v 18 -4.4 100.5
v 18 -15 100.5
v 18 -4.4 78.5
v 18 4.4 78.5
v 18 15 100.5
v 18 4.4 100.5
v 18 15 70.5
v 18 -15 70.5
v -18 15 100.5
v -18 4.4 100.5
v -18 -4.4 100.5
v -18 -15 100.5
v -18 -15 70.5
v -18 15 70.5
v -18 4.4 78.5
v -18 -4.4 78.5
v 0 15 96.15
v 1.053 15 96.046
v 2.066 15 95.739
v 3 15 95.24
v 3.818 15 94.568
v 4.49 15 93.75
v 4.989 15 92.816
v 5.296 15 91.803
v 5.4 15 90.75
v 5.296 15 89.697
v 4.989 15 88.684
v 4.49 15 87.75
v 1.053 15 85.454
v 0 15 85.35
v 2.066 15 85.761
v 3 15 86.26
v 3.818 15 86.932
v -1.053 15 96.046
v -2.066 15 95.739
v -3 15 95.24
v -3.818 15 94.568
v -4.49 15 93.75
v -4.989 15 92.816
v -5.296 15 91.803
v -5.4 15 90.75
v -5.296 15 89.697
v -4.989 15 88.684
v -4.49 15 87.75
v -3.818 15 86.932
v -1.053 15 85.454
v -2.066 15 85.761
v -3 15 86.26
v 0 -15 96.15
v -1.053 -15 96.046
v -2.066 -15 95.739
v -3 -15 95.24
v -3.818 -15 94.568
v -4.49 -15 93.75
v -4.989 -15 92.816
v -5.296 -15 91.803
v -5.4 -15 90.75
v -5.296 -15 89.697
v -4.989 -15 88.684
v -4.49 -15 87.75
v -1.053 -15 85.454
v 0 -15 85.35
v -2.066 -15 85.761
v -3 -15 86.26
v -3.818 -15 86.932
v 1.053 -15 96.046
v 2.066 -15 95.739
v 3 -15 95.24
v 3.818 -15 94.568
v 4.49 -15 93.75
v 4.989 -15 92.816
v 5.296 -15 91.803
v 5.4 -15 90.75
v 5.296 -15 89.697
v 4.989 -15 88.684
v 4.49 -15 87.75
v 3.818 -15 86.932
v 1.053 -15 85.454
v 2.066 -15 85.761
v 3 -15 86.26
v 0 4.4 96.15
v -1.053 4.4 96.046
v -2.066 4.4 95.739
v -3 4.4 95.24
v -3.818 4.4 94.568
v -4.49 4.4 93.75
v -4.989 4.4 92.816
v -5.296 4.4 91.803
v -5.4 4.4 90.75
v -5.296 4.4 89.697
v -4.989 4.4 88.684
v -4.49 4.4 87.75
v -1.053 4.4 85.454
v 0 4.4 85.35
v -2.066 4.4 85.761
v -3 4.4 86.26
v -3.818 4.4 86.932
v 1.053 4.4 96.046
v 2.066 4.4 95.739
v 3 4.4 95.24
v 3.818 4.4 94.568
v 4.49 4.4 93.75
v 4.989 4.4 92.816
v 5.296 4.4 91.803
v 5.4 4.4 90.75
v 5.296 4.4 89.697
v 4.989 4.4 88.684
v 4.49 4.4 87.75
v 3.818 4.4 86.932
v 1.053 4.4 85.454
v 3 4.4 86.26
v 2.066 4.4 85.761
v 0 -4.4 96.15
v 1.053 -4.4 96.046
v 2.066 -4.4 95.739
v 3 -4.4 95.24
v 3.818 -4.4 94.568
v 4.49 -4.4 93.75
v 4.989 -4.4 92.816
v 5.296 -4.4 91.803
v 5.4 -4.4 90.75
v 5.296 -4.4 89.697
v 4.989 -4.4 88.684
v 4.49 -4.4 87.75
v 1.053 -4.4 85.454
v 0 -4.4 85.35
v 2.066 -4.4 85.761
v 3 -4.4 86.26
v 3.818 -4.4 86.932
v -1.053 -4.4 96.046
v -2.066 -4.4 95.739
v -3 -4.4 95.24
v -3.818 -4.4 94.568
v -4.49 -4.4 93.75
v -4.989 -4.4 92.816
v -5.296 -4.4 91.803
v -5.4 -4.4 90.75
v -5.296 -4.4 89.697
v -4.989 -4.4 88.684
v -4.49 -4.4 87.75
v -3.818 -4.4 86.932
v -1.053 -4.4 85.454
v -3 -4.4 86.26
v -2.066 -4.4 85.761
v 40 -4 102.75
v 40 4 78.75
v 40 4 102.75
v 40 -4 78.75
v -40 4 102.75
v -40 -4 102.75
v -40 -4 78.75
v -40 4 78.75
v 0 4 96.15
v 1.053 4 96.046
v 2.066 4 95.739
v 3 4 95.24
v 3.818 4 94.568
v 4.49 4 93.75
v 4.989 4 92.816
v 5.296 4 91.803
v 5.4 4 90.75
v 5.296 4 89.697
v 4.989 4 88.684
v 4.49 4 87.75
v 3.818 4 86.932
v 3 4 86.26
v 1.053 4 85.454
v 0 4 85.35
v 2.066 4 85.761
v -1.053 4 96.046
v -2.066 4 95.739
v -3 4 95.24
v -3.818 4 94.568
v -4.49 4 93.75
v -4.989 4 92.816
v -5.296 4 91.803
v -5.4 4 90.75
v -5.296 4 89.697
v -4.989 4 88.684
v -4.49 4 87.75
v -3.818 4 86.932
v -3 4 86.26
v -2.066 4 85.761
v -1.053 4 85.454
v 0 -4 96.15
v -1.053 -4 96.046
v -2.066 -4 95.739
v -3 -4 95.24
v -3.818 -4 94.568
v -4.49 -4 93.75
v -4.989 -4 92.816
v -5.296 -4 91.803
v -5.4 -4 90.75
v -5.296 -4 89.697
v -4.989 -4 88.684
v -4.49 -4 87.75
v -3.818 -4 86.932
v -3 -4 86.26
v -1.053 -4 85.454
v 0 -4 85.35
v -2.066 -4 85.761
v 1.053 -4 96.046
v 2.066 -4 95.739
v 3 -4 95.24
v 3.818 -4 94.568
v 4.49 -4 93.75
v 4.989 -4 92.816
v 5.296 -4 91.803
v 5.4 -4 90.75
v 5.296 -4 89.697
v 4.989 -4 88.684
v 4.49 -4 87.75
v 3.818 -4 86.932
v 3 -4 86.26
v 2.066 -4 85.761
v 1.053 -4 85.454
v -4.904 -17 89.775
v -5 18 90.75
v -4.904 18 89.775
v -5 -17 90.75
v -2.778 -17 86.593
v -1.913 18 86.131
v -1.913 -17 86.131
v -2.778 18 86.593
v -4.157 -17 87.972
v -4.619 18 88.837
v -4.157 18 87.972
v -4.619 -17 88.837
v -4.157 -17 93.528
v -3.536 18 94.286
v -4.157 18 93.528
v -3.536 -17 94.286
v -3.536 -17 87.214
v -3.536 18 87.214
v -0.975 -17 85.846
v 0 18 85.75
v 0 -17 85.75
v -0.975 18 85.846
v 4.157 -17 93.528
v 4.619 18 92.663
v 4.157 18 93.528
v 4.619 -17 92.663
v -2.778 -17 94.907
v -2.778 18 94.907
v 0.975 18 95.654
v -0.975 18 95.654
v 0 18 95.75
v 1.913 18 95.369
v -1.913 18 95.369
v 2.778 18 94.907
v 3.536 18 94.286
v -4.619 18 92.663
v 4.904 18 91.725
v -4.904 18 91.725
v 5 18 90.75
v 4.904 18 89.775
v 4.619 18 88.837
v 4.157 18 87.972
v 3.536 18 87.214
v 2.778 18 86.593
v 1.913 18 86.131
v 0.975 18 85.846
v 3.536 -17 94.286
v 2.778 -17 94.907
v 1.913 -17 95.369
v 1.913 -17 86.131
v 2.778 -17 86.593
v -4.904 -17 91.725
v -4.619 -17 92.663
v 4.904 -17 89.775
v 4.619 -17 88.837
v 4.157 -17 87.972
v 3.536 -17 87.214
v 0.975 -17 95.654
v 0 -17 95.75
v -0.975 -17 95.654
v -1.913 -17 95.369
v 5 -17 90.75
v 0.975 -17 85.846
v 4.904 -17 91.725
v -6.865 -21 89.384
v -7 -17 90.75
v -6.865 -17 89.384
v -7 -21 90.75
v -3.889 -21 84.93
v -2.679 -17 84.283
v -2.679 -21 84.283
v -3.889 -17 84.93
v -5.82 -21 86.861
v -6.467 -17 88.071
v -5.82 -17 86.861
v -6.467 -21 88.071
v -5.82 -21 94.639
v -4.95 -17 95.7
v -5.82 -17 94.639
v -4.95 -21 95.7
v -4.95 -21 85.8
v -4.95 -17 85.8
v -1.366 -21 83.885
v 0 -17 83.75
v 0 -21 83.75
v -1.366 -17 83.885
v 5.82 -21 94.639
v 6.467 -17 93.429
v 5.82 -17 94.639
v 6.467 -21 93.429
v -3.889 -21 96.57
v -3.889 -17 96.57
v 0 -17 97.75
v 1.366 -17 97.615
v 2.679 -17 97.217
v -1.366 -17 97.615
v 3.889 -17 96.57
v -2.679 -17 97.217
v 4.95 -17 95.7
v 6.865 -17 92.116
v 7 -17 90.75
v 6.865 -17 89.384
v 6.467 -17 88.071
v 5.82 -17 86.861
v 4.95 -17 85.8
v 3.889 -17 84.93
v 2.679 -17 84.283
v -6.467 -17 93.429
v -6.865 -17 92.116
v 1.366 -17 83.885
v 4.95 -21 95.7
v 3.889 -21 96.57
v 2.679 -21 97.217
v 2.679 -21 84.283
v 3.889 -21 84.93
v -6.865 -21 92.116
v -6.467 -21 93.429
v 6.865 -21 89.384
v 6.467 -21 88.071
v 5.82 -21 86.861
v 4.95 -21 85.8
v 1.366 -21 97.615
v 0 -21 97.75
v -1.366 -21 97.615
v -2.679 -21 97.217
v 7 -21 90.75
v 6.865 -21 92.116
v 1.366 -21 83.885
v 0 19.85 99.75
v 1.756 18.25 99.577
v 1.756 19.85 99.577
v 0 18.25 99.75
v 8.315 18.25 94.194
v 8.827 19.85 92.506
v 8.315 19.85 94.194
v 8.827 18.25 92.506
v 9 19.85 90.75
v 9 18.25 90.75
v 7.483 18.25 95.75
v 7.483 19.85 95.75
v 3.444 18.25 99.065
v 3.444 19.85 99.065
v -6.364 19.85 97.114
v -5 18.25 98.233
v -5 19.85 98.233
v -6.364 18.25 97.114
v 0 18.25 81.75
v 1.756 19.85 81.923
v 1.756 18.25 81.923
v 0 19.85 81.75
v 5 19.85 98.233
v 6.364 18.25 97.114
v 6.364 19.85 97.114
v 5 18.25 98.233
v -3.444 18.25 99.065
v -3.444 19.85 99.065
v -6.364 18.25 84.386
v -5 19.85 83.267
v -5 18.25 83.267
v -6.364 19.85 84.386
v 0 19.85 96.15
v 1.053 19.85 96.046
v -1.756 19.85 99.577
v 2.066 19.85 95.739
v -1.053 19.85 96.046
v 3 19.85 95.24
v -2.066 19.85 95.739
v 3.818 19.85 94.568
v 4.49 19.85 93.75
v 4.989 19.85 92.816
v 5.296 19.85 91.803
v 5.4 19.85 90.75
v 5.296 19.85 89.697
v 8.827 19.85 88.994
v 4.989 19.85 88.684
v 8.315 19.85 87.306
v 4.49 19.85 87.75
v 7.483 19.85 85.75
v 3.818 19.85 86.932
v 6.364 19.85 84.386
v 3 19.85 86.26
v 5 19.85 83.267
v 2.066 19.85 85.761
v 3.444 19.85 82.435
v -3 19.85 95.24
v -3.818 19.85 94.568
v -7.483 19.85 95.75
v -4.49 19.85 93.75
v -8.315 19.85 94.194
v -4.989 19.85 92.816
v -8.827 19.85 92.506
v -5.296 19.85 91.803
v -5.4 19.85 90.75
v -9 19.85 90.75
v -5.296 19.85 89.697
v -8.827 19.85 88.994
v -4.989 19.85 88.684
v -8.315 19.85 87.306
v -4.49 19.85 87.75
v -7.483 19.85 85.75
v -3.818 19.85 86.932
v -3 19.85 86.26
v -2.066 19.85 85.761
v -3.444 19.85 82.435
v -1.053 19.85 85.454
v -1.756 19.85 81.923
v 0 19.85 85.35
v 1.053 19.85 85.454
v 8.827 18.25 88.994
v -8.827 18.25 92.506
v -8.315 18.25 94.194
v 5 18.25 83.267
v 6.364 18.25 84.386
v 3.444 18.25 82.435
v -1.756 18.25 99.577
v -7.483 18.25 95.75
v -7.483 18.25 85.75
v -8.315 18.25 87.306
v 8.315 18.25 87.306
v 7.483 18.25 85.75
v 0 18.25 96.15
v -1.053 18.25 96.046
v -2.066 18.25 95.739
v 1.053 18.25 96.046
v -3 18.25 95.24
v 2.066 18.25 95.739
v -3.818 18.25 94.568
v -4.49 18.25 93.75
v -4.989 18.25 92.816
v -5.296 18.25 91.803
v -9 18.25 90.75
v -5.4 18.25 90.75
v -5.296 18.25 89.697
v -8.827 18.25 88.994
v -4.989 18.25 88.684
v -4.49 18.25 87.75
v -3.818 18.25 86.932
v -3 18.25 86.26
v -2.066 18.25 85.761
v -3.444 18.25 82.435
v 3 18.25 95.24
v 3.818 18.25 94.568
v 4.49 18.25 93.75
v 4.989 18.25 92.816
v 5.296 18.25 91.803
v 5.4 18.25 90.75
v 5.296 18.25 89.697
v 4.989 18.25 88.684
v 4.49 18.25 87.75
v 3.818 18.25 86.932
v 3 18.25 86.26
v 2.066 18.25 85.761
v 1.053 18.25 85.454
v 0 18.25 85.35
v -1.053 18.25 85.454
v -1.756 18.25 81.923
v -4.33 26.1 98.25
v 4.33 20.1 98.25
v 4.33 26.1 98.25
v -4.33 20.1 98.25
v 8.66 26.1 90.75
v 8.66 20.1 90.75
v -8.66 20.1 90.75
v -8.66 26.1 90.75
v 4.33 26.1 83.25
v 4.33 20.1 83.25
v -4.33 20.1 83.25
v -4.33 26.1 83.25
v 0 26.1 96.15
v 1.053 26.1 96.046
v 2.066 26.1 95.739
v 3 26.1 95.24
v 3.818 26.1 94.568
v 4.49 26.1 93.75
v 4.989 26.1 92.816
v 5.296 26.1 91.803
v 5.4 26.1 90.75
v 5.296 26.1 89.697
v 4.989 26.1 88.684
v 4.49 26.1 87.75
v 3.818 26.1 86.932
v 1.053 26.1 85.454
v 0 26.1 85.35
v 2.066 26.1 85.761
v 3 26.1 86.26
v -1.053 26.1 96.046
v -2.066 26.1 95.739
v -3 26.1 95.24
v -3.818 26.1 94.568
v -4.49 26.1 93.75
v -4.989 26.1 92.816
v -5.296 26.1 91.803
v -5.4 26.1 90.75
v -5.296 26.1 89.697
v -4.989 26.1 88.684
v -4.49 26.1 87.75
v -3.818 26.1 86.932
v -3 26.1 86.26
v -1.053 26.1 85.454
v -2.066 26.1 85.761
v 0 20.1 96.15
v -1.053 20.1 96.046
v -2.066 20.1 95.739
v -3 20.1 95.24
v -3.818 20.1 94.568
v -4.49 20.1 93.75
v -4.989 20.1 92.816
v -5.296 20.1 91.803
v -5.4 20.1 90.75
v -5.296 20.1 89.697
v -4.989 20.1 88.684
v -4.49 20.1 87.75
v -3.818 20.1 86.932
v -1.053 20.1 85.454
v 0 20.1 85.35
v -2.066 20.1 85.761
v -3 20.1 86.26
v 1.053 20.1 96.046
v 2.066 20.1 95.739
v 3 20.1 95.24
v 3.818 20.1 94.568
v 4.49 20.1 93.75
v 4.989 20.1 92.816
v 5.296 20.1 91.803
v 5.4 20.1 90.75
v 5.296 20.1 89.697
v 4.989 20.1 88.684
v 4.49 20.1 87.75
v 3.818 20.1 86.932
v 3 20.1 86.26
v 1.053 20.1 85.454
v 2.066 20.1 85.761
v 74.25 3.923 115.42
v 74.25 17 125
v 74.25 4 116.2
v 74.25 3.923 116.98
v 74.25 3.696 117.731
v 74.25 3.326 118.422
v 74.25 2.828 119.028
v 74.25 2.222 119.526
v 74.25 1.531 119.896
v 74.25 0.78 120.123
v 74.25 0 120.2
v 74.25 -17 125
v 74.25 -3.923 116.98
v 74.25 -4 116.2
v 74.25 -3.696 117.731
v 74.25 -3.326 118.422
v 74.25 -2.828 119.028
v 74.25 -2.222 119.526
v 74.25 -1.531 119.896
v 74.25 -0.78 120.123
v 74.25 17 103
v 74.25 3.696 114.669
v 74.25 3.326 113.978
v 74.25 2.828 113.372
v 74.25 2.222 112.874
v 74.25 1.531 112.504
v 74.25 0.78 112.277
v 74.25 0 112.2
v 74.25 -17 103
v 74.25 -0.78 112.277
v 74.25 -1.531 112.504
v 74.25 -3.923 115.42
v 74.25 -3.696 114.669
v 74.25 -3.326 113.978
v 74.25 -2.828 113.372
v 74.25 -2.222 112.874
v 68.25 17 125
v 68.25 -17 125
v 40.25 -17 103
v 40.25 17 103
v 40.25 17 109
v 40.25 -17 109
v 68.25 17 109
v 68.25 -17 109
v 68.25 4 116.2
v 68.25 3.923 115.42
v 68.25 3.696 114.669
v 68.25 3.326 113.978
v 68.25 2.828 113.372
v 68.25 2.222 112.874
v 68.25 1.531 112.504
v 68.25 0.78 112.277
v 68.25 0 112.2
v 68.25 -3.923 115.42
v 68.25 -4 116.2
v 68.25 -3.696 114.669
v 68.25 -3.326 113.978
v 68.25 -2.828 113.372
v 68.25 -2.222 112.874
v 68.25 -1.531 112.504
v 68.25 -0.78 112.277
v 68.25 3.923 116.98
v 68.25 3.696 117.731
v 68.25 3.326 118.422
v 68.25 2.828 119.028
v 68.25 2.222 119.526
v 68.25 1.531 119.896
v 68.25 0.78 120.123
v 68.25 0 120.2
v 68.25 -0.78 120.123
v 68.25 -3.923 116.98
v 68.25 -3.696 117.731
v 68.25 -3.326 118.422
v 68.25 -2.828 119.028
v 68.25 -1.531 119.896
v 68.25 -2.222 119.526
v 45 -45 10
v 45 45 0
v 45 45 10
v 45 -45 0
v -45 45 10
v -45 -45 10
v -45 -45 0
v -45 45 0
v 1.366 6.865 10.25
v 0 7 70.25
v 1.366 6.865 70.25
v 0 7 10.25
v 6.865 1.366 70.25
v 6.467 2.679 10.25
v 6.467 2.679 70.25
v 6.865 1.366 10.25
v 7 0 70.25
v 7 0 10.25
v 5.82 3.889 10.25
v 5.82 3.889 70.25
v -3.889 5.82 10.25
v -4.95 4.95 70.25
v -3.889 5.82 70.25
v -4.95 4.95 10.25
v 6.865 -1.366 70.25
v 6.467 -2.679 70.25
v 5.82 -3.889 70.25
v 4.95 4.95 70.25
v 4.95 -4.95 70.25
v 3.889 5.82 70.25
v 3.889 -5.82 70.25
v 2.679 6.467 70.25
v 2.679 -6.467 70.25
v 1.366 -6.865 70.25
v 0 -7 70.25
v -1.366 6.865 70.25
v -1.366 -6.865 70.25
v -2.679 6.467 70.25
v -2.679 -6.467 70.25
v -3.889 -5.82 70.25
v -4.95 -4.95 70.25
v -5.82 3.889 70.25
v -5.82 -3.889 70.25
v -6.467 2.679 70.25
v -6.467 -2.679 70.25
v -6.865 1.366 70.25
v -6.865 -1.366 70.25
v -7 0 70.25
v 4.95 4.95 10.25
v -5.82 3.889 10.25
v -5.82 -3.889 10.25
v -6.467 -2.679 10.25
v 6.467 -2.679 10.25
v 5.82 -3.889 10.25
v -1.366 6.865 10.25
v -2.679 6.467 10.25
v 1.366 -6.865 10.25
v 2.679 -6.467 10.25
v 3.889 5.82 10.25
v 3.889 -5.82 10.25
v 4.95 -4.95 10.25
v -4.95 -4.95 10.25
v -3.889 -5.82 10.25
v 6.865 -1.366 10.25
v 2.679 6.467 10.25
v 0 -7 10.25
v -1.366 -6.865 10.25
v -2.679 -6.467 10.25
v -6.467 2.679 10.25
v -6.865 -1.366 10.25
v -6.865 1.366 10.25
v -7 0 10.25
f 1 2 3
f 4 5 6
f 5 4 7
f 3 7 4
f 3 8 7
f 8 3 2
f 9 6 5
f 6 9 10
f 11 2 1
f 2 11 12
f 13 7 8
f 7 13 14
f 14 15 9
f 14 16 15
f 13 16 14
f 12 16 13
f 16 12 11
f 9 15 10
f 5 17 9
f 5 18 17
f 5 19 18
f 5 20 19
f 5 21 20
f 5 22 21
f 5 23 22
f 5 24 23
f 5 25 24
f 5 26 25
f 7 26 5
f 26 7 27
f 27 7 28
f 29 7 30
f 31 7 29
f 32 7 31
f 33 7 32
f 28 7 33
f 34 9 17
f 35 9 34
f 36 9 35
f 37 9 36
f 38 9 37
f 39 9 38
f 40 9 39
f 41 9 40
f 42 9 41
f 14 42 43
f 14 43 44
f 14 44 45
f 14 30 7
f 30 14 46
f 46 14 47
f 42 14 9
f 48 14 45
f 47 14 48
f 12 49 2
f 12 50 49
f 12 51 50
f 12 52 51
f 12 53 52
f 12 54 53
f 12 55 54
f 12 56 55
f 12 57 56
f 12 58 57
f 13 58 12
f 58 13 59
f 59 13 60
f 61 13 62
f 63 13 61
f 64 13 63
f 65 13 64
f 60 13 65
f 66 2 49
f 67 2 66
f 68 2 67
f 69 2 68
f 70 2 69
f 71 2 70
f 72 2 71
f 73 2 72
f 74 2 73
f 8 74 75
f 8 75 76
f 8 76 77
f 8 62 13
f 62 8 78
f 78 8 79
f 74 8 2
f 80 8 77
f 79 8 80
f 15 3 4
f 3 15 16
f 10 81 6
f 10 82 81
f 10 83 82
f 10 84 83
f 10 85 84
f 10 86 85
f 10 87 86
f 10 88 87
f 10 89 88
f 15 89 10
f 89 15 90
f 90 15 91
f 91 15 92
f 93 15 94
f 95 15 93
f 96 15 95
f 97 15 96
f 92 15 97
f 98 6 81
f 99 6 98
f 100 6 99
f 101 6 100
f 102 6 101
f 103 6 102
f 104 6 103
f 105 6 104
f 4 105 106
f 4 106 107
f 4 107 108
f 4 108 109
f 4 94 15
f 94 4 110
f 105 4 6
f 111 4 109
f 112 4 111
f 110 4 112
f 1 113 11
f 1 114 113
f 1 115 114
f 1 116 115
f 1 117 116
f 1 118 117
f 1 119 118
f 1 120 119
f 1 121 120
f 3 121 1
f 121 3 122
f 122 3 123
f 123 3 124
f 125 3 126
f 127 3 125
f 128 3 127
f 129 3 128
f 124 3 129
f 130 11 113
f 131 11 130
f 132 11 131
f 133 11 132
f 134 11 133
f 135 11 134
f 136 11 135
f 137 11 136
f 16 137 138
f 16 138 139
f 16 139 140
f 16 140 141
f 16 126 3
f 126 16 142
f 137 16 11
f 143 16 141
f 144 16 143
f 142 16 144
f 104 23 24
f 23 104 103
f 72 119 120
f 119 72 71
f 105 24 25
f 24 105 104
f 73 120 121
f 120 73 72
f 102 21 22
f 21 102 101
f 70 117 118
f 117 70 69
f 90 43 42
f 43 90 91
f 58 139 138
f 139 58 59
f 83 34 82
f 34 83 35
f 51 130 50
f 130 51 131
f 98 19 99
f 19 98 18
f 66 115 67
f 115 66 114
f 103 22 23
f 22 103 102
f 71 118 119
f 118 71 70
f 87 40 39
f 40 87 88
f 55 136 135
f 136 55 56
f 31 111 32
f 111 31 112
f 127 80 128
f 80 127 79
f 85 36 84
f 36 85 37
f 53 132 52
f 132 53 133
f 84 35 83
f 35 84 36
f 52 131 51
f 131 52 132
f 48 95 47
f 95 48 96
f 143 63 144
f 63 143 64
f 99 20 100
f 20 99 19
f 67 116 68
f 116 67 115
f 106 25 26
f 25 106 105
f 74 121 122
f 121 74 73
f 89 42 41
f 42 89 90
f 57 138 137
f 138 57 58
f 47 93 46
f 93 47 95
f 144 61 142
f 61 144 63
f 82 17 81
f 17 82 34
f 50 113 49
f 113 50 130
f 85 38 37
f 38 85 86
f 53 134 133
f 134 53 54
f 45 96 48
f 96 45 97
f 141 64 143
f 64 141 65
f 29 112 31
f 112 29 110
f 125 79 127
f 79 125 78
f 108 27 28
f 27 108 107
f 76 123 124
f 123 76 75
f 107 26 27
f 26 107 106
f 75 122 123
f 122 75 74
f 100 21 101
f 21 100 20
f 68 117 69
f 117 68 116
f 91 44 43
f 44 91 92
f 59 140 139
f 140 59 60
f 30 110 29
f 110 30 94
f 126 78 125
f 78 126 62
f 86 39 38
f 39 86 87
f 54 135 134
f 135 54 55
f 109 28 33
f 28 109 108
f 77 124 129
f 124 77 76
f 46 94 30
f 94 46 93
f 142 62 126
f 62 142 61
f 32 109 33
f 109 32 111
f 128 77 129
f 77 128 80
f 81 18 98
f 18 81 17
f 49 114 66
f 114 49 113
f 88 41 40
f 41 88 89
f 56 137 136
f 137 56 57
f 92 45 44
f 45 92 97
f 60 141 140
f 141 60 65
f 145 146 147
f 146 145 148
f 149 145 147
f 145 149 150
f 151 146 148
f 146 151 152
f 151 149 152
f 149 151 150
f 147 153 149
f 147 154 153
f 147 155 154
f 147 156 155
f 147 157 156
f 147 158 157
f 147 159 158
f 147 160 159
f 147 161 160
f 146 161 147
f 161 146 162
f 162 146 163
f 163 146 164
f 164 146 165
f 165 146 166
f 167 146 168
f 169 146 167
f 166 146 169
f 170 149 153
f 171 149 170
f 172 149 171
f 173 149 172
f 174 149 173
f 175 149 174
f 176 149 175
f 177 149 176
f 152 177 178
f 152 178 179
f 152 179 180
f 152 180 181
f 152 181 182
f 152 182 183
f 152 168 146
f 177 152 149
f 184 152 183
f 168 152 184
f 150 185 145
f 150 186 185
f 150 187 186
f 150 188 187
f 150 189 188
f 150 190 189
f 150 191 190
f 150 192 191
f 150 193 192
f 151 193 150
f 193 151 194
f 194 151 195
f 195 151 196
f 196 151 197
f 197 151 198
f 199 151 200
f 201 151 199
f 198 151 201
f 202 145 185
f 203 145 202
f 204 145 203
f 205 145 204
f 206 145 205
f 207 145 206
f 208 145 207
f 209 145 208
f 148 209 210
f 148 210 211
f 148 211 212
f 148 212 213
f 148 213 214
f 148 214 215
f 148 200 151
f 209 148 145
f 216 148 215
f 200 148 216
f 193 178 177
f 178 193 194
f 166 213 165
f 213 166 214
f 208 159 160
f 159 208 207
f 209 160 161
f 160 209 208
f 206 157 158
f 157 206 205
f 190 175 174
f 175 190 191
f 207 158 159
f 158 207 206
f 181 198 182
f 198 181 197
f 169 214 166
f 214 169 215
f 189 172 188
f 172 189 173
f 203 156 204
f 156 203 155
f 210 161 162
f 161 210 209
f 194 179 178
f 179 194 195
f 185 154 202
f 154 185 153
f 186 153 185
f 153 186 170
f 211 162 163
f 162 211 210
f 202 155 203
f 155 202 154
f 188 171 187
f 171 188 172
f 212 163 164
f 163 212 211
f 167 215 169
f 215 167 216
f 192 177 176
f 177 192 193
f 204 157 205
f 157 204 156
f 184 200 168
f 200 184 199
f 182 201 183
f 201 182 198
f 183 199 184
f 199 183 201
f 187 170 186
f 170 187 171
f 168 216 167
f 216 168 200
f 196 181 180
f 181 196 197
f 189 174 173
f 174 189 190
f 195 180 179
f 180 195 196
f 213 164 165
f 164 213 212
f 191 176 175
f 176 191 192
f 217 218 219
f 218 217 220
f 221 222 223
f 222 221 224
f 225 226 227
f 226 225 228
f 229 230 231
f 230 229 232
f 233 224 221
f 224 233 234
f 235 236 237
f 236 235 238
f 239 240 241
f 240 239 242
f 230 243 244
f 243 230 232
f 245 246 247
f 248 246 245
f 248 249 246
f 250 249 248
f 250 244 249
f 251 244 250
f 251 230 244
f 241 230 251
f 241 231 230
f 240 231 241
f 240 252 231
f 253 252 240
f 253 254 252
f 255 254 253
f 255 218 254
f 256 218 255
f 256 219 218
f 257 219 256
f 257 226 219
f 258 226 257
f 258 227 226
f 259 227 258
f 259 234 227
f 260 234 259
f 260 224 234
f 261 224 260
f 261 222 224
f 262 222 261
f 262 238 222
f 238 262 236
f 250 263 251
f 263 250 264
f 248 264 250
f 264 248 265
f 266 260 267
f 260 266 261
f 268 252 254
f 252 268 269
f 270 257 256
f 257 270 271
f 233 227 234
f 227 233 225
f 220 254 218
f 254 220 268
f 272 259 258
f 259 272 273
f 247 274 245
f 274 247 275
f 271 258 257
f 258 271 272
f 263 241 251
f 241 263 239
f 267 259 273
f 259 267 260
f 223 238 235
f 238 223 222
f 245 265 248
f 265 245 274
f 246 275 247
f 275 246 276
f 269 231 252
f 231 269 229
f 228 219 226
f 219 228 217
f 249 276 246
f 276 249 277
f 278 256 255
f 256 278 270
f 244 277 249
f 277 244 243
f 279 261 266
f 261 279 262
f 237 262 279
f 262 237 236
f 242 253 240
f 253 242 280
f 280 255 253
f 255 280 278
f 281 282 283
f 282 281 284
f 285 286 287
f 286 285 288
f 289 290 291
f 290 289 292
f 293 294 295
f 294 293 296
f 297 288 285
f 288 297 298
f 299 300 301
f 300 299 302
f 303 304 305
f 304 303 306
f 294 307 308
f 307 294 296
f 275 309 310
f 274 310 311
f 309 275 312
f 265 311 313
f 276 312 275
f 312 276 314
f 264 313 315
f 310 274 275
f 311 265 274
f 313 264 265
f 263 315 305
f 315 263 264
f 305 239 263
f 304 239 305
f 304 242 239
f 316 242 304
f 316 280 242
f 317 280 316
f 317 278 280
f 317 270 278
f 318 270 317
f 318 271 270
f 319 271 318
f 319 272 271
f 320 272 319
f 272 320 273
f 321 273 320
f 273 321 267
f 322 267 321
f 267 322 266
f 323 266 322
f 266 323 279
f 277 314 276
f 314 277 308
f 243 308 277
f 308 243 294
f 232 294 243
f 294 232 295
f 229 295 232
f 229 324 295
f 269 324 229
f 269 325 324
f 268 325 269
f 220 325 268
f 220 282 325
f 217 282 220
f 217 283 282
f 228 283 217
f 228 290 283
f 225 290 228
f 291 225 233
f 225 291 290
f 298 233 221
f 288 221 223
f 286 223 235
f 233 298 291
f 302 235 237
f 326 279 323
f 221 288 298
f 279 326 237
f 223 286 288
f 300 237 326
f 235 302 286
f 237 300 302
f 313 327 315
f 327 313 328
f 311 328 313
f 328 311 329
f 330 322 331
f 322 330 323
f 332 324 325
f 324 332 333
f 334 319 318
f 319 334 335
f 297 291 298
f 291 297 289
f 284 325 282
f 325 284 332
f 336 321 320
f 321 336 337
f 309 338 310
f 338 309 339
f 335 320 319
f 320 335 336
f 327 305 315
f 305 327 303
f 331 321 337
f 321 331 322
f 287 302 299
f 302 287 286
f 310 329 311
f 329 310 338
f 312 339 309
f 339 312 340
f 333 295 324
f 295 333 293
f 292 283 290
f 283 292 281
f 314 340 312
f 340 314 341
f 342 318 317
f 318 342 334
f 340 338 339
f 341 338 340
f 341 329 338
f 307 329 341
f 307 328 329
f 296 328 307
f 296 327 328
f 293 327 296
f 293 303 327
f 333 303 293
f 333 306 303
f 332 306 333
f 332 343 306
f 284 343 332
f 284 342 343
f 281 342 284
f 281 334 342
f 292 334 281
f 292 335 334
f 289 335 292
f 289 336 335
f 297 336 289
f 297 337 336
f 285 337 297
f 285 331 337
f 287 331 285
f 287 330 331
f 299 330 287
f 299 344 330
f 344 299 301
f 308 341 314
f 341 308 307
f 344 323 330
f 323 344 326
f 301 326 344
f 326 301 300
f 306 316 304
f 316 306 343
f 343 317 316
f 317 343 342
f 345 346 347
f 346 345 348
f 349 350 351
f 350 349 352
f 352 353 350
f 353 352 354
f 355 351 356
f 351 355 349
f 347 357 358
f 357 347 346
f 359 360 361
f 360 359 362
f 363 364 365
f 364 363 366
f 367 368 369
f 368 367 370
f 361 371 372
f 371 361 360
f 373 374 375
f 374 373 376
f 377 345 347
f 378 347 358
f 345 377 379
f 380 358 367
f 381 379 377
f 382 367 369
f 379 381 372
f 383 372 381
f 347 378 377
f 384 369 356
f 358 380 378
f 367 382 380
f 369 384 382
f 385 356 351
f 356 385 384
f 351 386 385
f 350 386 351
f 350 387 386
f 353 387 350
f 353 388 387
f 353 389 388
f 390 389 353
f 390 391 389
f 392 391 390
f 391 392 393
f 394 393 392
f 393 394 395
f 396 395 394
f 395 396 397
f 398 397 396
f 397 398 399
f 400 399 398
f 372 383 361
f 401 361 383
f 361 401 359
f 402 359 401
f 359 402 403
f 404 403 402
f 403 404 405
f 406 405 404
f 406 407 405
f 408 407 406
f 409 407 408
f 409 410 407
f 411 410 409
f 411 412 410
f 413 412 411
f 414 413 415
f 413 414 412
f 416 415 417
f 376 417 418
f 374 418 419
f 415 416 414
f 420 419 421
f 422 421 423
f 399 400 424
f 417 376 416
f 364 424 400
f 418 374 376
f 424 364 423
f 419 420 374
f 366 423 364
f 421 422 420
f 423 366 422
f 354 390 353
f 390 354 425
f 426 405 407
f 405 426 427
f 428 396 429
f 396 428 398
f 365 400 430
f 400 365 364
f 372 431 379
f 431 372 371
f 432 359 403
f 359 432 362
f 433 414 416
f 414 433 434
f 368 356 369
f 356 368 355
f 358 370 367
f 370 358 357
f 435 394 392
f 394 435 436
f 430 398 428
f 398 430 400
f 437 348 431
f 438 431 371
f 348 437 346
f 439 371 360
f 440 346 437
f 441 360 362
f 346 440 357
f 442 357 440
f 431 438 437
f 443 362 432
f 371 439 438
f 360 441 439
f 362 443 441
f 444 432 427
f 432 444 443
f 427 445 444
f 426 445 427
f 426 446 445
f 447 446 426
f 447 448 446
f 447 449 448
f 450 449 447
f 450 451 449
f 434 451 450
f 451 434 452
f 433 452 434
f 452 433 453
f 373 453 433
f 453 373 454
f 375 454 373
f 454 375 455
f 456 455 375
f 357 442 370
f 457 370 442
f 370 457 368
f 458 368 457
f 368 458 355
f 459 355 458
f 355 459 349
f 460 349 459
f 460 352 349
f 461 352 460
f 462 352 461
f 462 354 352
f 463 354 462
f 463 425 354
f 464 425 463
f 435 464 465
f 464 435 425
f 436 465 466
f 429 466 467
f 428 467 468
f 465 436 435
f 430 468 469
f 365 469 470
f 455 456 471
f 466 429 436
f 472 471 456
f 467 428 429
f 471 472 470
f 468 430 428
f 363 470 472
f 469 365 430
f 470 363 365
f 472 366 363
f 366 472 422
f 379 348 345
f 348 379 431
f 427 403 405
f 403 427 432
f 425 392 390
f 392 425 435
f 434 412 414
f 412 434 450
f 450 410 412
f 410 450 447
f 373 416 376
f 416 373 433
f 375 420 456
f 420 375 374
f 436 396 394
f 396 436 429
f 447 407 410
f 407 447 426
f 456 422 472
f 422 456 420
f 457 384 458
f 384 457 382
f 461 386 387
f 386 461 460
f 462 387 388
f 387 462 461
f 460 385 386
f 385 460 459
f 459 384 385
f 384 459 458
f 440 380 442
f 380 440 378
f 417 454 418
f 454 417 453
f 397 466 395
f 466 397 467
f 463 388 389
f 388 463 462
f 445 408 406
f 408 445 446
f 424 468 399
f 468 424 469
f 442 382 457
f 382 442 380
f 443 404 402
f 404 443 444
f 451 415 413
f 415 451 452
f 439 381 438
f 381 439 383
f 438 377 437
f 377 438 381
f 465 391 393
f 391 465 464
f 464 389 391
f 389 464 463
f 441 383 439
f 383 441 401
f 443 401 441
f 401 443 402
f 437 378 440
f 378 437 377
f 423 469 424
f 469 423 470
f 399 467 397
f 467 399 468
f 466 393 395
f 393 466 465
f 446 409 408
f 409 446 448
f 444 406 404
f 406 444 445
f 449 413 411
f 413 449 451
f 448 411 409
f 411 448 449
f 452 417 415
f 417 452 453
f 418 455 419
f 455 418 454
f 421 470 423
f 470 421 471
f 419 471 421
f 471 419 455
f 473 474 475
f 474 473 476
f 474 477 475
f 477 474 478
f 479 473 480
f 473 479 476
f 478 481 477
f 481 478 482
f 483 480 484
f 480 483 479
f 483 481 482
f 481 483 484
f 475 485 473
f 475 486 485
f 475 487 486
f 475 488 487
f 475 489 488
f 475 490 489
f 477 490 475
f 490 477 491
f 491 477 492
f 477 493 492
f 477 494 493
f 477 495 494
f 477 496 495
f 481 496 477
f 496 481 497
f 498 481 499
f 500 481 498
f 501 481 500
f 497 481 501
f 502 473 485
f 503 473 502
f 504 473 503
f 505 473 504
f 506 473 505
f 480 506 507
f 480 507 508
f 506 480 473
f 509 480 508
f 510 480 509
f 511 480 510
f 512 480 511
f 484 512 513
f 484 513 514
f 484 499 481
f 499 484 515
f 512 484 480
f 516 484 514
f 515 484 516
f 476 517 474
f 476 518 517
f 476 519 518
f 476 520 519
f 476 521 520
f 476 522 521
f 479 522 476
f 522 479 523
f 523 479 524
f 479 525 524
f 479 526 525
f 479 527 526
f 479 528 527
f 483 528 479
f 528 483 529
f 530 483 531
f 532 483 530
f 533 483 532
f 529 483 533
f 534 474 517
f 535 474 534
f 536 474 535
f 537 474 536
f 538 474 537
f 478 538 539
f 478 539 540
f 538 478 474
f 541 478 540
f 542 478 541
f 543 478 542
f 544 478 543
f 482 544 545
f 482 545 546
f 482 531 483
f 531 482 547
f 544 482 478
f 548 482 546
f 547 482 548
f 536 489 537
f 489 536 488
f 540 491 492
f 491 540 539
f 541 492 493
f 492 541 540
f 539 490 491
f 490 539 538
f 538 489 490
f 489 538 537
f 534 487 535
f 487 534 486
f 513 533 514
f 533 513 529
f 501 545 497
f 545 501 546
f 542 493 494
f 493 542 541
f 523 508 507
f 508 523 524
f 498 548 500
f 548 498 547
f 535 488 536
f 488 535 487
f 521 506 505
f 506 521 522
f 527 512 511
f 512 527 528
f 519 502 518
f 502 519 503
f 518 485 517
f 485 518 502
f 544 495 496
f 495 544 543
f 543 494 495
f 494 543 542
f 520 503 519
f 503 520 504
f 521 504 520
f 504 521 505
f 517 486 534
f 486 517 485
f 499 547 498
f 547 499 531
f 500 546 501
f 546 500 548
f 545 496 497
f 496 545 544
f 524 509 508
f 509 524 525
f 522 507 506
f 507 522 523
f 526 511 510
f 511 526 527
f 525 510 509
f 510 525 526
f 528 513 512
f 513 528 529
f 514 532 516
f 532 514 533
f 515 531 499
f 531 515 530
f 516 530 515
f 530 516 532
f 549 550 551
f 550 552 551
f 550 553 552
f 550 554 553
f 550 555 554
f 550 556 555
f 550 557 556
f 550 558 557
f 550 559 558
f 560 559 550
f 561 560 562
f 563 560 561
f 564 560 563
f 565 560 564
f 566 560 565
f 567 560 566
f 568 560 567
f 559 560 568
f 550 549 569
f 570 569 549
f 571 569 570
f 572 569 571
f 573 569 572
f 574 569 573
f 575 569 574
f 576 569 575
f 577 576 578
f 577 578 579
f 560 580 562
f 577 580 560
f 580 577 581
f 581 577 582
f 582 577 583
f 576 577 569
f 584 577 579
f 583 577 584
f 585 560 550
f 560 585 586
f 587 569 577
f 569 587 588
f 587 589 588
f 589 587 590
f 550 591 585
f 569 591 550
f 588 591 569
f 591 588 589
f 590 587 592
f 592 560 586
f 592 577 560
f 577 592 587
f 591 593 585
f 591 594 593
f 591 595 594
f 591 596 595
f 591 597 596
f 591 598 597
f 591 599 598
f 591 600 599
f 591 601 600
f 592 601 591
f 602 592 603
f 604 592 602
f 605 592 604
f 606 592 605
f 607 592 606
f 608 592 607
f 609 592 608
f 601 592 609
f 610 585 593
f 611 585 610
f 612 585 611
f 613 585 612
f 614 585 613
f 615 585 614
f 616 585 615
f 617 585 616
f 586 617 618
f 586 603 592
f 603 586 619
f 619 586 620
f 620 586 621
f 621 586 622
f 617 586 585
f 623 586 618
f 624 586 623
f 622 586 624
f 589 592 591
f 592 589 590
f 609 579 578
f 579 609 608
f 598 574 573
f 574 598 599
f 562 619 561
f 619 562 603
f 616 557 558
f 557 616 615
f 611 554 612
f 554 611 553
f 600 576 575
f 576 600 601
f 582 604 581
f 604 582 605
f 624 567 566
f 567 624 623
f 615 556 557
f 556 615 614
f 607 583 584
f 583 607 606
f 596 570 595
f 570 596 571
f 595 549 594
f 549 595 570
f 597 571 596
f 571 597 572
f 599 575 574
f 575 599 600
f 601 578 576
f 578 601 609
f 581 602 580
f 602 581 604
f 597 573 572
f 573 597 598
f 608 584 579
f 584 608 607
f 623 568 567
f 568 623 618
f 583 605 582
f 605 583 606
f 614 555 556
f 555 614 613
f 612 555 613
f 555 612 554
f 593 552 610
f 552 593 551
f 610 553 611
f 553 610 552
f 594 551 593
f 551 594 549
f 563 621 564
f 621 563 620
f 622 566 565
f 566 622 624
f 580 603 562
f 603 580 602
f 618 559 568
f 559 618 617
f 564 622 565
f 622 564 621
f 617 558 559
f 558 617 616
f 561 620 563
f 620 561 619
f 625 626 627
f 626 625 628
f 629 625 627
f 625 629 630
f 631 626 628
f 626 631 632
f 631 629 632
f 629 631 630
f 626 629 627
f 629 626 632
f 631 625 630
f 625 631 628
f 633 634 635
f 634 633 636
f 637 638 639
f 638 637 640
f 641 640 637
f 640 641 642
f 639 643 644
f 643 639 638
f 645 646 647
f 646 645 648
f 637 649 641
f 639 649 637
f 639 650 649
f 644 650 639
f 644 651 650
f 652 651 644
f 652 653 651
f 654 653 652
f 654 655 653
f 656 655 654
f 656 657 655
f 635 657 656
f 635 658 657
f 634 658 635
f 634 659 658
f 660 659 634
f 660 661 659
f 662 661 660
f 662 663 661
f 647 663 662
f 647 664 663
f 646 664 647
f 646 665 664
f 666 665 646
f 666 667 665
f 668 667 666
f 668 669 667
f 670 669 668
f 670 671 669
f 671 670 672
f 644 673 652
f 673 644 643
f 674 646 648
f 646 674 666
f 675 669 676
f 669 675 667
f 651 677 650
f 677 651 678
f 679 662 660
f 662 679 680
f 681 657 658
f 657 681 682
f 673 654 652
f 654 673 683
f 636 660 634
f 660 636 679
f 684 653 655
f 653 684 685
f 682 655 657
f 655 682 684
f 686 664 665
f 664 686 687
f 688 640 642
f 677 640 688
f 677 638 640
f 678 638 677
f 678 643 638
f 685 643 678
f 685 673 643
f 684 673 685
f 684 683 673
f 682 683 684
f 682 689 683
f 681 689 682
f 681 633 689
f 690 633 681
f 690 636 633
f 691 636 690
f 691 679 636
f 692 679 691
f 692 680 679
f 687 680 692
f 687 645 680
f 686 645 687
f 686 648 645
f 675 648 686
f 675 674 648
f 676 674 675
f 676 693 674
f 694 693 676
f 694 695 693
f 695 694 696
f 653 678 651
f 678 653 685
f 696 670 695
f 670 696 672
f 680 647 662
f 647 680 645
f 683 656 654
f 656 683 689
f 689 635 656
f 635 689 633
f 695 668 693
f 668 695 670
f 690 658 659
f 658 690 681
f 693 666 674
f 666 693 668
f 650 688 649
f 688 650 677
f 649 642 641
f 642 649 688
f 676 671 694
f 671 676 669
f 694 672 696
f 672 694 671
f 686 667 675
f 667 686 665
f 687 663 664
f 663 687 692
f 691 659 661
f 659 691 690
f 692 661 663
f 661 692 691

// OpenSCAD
$fn = 32;

// ------------------------------------------------------------------------
// Lamp arm: column d14 x 60 mm, arm 80 mm
// Every part is its own module, assembly() places every instance.
// ------------------------------------------------------------------------

// --- part 1 ---
module lamp_base() {
  difference() {
    translate([-45, -45, 0]) cube([90, 90, 10]);
  }
}

// --- part 2 ---
module lamp_column() {
  cylinder(h = 60, d = 14);
}

// --- part 3 ---
module head_fork() {
  difference() {
    translate([-18, -15, 0]) cube([36, 30, 30]);
    translate([-19, -4.4, 8]) cube([38, 8.8, 23]);
    translate([0, 0, 20.25]) rotate([90, 0, 0]) cylinder(h = 32, d = 10.8, center = true);
  }
}

// --- part 4 ---
module lamp_arm() {
  difference() {
    translate([-40, -4, 0]) cube([80, 8, 24]);
    translate([0, 0, 12]) rotate([90, 0, 0]) cylinder(h = 10, d = 10.8, center = true);
  }
}

// --- part 5 ---
module arm_pin() {
  rotate([0, 90, 0]) cylinder(h = 36, d = 10, center = true);
  translate([-21, 0, 0]) rotate([0, 90, 0]) cylinder(h = 4, d = 14);
}

// --- part 6 ---
module arm_washer() {
  difference() {
      translate([0, 0, 0]) cylinder(h = 1.6, d = 18);
      translate([0, 0, -1]) cylinder(h = 3.6, d = 10.8);
    }
}

// --- part 7 ---
module arm_nut() {
  difference() {
    linear_extrude(height = 6) polygon(points = [[8.66, 0], [4.33, 7.5], [-4.33, 7.5], [-8.66, 0], [-4.33, -7.5], [4.33, -7.5]]);
    translate([0, 0, -1]) cylinder(h = 8, d = 10.8);
  }
}

// --- part 8 ---
module shade_bracket() {
  difference() {
    translate([-17, -17, 0]) cube([34, 34, 22]);
    translate([-18, -18, 6]) cube([29, 36, 17]);
    translate([14, 0, 13.2]) rotate([0, 90, 0]) cylinder(h = 8, d = 8, center = true);
  }
}

// --- assembly ---
module assembly() {
  color([0.80, 0.24, 0.20]) translate([0, 0, 0]) rotate([0, 0, 0]) lamp_base();
  color([0.20, 0.45, 0.75]) translate([0, 0, 10.25]) rotate([0, 0, 0]) lamp_column();
  color([0.25, 0.62, 0.32]) translate([0, 0, 70.5]) rotate([0, 0, 0]) head_fork();
  color([0.92, 0.70, 0.18]) translate([0, 0, 78.75]) rotate([0, 0, 0]) lamp_arm();
  color([0.58, 0.35, 0.70]) translate([0, 0, 90.75]) rotate([0, 0, 90]) arm_pin();
  color([0.16, 0.66, 0.66]) translate([0, 19.85, 90.75]) rotate([90, 0, 0]) arm_washer();
  color([0.85, 0.48, 0.18]) translate([0, 26.1, 90.75]) rotate([90, 0, 0]) arm_nut();
  color([0.55, 0.60, 0.65]) translate([57.25, 0, 103]) rotate([0, 0, 0]) shade_bracket();
}

assembly();
